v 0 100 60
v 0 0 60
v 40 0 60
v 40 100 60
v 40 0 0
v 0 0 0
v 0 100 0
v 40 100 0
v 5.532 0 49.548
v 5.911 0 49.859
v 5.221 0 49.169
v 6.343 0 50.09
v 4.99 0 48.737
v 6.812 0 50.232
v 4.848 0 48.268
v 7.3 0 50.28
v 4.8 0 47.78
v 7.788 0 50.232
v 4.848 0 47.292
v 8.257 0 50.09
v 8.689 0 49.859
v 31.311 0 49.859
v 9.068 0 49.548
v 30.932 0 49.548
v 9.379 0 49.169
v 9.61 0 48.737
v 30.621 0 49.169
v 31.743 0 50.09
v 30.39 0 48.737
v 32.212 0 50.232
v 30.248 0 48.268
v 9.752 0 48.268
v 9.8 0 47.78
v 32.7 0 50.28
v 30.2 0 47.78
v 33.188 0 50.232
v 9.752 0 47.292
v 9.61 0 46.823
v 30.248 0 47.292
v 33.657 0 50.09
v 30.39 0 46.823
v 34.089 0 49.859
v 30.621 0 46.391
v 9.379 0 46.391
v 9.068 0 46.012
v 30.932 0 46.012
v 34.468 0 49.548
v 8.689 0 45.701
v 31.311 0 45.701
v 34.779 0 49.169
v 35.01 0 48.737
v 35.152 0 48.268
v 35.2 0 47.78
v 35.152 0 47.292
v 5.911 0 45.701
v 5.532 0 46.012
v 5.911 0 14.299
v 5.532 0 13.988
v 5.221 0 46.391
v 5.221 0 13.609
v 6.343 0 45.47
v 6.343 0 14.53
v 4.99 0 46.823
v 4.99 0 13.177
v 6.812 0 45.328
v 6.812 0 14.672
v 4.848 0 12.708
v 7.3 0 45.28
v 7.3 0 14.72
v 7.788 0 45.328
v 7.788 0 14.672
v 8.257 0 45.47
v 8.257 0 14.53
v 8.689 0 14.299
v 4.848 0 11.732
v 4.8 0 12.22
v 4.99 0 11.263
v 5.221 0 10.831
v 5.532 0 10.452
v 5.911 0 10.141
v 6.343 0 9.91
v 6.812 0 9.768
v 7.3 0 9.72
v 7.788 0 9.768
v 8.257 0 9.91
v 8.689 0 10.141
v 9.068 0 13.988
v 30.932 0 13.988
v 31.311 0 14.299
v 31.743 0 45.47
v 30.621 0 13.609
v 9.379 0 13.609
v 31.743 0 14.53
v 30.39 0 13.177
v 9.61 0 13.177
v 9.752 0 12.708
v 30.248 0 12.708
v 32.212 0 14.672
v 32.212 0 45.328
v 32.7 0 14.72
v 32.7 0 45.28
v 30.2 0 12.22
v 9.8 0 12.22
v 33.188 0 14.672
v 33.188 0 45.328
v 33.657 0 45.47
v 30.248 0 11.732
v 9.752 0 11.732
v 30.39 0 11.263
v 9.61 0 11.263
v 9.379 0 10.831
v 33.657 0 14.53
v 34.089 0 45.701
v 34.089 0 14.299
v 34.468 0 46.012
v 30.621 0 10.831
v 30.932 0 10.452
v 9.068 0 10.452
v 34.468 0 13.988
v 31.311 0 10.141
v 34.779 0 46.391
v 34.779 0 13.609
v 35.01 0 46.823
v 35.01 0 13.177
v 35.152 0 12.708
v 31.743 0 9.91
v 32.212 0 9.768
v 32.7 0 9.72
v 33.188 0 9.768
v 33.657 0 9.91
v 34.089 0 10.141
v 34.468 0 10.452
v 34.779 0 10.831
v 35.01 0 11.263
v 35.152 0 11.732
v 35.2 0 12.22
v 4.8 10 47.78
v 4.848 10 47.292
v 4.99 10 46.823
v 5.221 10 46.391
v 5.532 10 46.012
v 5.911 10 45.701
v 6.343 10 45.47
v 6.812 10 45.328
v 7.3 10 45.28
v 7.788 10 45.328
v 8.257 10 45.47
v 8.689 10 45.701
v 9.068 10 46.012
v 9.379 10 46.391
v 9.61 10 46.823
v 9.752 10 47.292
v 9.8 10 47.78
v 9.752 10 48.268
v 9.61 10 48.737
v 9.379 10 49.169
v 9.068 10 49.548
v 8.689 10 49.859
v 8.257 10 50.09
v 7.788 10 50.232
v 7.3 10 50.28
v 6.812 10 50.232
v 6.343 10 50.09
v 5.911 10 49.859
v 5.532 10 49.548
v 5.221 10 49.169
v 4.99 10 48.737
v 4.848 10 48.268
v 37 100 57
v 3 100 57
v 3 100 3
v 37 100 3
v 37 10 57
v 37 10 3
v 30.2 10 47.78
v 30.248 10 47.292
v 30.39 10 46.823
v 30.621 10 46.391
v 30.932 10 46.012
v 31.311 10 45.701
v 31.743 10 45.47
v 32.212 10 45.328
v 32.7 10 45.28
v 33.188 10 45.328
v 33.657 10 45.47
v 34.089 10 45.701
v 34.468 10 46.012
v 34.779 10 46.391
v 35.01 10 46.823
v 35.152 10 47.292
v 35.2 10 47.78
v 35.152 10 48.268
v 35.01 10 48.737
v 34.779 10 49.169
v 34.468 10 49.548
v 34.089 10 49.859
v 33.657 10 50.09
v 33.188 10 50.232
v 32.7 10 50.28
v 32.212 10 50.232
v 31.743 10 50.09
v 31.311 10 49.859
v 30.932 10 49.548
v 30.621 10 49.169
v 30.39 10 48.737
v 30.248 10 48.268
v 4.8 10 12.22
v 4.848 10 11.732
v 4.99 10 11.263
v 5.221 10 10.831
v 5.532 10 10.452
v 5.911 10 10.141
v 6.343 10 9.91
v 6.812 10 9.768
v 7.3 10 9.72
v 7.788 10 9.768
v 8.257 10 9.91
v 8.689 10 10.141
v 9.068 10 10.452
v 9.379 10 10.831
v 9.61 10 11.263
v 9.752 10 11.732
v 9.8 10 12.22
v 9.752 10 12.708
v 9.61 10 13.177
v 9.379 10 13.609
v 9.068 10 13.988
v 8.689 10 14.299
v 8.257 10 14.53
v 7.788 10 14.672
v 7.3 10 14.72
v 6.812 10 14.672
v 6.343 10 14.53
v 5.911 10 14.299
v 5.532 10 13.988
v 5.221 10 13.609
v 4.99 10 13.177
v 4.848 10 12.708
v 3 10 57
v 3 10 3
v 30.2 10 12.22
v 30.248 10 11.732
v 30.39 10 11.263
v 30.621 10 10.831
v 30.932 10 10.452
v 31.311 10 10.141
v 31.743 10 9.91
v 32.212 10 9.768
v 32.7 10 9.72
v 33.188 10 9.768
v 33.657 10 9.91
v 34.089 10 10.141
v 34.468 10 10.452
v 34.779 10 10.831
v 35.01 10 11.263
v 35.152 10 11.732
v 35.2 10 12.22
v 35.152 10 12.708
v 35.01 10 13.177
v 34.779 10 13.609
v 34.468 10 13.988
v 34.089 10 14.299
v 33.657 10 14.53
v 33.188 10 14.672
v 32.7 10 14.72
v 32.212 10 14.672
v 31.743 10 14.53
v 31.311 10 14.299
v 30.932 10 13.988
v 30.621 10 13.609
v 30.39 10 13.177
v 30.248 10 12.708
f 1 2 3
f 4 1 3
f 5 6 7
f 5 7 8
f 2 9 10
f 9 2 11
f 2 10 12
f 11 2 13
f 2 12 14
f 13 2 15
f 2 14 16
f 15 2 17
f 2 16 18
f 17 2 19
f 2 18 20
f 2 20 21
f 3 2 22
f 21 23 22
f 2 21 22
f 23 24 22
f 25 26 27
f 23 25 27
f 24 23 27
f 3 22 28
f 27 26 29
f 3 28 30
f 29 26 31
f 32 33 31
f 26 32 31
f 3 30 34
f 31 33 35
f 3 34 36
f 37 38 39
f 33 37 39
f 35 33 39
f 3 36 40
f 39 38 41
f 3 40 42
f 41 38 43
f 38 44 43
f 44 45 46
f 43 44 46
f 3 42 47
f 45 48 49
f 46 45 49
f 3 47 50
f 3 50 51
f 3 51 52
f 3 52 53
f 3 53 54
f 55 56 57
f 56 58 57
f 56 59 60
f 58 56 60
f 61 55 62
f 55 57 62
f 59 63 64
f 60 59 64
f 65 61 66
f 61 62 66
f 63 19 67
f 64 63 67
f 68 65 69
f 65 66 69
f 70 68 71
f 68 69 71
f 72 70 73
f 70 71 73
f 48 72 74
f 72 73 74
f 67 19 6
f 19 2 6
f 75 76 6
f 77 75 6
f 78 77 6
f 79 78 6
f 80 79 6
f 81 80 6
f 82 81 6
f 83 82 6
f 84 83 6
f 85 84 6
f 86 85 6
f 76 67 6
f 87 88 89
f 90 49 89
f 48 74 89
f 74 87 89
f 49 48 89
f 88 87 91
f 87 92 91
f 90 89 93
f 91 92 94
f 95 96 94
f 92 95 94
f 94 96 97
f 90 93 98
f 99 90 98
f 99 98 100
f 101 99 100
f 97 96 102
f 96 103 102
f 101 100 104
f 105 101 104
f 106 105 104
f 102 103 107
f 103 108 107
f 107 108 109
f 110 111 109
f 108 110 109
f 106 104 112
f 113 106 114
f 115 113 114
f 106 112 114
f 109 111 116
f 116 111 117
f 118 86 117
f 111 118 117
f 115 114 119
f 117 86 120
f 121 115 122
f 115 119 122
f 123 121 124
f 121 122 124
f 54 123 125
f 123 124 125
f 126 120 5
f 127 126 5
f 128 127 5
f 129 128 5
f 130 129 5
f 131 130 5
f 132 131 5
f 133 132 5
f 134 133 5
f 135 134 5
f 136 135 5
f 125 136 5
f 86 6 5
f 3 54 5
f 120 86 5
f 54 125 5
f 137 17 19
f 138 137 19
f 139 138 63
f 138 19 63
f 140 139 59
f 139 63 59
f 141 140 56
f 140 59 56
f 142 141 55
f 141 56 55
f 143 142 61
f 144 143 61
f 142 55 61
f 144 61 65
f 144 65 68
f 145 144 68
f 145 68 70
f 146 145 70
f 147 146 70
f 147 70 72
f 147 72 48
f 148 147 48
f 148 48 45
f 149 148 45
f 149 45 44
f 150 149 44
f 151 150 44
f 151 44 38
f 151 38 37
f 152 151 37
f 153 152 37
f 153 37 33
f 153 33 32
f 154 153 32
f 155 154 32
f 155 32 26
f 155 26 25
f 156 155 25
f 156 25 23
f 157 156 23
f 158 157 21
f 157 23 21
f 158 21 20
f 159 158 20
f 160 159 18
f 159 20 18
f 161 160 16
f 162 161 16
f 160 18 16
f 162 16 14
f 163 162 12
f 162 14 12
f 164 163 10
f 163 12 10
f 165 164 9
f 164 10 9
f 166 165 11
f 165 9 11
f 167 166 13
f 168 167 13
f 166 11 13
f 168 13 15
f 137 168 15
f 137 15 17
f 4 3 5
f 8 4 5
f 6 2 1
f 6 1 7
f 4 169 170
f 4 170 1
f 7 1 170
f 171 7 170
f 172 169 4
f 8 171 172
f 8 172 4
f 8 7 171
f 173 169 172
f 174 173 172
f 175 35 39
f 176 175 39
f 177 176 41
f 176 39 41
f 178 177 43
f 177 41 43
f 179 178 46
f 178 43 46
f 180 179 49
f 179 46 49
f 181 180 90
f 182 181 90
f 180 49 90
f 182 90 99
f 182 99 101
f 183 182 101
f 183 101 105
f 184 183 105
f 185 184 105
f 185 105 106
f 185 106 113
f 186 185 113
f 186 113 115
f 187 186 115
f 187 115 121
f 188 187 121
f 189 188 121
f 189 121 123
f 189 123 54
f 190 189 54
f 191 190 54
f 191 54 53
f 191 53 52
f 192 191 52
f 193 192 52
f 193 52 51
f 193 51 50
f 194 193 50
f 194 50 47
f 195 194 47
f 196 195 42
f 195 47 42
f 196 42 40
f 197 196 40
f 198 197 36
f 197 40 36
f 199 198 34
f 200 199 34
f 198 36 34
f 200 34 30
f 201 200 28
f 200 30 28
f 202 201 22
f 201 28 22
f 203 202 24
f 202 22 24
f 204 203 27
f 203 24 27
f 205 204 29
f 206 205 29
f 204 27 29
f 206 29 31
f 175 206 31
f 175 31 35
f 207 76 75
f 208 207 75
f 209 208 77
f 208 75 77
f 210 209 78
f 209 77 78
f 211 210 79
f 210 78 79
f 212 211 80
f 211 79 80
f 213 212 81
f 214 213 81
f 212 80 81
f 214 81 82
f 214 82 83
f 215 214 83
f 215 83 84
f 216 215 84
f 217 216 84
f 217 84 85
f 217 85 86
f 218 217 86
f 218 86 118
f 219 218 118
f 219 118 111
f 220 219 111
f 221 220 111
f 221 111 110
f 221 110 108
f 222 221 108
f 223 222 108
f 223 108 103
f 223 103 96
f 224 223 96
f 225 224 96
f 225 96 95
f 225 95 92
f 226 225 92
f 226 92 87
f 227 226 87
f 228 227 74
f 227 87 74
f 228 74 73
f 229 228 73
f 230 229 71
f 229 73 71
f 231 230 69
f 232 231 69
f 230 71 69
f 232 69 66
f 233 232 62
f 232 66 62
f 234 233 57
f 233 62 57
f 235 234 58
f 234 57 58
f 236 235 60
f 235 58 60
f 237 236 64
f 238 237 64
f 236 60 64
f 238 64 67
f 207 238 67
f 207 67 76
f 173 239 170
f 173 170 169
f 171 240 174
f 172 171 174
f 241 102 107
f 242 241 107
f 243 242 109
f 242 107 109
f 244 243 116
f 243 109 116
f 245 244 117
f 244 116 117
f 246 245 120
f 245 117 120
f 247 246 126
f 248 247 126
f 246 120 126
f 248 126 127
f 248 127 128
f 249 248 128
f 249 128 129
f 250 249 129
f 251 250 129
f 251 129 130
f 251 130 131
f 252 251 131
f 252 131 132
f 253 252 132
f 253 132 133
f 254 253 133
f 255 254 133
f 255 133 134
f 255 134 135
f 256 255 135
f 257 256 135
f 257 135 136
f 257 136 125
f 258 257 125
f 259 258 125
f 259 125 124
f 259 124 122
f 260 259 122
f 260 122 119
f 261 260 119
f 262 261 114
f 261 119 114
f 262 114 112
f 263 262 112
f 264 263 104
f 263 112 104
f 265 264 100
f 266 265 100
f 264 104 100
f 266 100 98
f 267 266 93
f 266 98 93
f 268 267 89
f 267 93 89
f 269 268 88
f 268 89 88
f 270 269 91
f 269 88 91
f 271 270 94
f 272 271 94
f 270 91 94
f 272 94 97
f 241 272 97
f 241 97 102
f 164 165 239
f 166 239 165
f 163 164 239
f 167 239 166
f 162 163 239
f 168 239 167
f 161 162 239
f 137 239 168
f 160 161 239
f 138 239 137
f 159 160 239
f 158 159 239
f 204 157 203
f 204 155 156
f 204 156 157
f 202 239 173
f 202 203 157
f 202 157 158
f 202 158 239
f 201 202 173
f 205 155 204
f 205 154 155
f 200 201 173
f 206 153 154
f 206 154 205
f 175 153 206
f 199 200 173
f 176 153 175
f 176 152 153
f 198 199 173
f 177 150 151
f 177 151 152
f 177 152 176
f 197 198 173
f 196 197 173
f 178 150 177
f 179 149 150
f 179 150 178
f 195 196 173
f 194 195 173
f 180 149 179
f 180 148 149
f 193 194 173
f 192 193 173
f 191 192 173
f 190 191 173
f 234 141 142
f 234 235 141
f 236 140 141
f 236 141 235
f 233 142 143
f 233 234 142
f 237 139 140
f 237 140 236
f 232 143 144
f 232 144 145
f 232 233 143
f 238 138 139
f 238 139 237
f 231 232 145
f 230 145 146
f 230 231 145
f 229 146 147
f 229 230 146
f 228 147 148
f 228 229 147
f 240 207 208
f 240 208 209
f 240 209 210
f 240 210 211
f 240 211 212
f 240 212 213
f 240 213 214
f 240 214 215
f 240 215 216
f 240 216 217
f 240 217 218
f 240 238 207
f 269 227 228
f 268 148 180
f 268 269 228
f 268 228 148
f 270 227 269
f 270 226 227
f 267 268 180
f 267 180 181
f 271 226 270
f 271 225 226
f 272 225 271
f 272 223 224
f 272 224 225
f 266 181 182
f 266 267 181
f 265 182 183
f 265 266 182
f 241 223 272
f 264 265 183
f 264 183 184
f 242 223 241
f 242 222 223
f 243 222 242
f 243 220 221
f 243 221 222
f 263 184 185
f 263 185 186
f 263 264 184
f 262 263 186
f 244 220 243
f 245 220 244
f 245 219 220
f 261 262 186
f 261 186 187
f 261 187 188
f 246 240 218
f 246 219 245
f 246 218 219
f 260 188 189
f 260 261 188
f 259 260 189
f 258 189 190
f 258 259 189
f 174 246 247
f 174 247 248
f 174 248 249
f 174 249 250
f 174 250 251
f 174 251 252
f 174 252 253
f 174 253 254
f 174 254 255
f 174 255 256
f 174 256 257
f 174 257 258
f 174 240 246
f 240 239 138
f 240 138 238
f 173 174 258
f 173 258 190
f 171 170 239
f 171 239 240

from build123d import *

# Parameters (mm, degrees)
SKETCH1_W               = 40
SKETCH1_H               = 60
BOSS_EXTRUDE1_DEPTH     = 100
CUT_EXTRUDE1_DEPTH      = 124.288280059
CUT_EXTRUDE1_DEPTH_BACK = 90
SKETCH2_W               = 34
SKETCH2_H               = 54
F_5_0_MM_DOWEL_HOLES1_D = 5


with BuildPart() as part:
    # Sketch1 → Boss-Extrude1 (new body)
    with BuildSketch(Plane(origin=(0, 0, 0), x_dir=(1, 0, 0), z_dir=(0, 1, 0))):
        with Locations((20, -30)):
            Rectangle(SKETCH1_W, SKETCH1_H)
    extrude(amount=BOSS_EXTRUDE1_DEPTH)

    # Sketch2 → Cut-Extrude1 (cut, two sides: drawn at the far end of the back side and taken through both)
    with BuildSketch(Plane(origin=(0, 100, 0), x_dir=(1, 0, 0), z_dir=(0, 1, 0)).offset(-CUT_EXTRUDE1_DEPTH_BACK)):
        with Locations((20, -30)):
            Rectangle(SKETCH2_W, SKETCH2_H)
    extrude(amount=CUT_EXTRUDE1_DEPTH + CUT_EXTRUDE1_DEPTH_BACK, mode=Mode.SUBTRACT)

    # Ø5.0 mm Dowel Holes1 (through all)
    with Locations(Plane(origin=(0, 10, 0), x_dir=(1, 0, 0), z_dir=(0, 1, 0))):
        with Locations((32.7, -12.22), (7.3, -12.22), (7.3, -47.78), (32.7, -47.78)):
            Hole(F_5_0_MM_DOWEL_HOLES1_D / 2)


solid = part.part
